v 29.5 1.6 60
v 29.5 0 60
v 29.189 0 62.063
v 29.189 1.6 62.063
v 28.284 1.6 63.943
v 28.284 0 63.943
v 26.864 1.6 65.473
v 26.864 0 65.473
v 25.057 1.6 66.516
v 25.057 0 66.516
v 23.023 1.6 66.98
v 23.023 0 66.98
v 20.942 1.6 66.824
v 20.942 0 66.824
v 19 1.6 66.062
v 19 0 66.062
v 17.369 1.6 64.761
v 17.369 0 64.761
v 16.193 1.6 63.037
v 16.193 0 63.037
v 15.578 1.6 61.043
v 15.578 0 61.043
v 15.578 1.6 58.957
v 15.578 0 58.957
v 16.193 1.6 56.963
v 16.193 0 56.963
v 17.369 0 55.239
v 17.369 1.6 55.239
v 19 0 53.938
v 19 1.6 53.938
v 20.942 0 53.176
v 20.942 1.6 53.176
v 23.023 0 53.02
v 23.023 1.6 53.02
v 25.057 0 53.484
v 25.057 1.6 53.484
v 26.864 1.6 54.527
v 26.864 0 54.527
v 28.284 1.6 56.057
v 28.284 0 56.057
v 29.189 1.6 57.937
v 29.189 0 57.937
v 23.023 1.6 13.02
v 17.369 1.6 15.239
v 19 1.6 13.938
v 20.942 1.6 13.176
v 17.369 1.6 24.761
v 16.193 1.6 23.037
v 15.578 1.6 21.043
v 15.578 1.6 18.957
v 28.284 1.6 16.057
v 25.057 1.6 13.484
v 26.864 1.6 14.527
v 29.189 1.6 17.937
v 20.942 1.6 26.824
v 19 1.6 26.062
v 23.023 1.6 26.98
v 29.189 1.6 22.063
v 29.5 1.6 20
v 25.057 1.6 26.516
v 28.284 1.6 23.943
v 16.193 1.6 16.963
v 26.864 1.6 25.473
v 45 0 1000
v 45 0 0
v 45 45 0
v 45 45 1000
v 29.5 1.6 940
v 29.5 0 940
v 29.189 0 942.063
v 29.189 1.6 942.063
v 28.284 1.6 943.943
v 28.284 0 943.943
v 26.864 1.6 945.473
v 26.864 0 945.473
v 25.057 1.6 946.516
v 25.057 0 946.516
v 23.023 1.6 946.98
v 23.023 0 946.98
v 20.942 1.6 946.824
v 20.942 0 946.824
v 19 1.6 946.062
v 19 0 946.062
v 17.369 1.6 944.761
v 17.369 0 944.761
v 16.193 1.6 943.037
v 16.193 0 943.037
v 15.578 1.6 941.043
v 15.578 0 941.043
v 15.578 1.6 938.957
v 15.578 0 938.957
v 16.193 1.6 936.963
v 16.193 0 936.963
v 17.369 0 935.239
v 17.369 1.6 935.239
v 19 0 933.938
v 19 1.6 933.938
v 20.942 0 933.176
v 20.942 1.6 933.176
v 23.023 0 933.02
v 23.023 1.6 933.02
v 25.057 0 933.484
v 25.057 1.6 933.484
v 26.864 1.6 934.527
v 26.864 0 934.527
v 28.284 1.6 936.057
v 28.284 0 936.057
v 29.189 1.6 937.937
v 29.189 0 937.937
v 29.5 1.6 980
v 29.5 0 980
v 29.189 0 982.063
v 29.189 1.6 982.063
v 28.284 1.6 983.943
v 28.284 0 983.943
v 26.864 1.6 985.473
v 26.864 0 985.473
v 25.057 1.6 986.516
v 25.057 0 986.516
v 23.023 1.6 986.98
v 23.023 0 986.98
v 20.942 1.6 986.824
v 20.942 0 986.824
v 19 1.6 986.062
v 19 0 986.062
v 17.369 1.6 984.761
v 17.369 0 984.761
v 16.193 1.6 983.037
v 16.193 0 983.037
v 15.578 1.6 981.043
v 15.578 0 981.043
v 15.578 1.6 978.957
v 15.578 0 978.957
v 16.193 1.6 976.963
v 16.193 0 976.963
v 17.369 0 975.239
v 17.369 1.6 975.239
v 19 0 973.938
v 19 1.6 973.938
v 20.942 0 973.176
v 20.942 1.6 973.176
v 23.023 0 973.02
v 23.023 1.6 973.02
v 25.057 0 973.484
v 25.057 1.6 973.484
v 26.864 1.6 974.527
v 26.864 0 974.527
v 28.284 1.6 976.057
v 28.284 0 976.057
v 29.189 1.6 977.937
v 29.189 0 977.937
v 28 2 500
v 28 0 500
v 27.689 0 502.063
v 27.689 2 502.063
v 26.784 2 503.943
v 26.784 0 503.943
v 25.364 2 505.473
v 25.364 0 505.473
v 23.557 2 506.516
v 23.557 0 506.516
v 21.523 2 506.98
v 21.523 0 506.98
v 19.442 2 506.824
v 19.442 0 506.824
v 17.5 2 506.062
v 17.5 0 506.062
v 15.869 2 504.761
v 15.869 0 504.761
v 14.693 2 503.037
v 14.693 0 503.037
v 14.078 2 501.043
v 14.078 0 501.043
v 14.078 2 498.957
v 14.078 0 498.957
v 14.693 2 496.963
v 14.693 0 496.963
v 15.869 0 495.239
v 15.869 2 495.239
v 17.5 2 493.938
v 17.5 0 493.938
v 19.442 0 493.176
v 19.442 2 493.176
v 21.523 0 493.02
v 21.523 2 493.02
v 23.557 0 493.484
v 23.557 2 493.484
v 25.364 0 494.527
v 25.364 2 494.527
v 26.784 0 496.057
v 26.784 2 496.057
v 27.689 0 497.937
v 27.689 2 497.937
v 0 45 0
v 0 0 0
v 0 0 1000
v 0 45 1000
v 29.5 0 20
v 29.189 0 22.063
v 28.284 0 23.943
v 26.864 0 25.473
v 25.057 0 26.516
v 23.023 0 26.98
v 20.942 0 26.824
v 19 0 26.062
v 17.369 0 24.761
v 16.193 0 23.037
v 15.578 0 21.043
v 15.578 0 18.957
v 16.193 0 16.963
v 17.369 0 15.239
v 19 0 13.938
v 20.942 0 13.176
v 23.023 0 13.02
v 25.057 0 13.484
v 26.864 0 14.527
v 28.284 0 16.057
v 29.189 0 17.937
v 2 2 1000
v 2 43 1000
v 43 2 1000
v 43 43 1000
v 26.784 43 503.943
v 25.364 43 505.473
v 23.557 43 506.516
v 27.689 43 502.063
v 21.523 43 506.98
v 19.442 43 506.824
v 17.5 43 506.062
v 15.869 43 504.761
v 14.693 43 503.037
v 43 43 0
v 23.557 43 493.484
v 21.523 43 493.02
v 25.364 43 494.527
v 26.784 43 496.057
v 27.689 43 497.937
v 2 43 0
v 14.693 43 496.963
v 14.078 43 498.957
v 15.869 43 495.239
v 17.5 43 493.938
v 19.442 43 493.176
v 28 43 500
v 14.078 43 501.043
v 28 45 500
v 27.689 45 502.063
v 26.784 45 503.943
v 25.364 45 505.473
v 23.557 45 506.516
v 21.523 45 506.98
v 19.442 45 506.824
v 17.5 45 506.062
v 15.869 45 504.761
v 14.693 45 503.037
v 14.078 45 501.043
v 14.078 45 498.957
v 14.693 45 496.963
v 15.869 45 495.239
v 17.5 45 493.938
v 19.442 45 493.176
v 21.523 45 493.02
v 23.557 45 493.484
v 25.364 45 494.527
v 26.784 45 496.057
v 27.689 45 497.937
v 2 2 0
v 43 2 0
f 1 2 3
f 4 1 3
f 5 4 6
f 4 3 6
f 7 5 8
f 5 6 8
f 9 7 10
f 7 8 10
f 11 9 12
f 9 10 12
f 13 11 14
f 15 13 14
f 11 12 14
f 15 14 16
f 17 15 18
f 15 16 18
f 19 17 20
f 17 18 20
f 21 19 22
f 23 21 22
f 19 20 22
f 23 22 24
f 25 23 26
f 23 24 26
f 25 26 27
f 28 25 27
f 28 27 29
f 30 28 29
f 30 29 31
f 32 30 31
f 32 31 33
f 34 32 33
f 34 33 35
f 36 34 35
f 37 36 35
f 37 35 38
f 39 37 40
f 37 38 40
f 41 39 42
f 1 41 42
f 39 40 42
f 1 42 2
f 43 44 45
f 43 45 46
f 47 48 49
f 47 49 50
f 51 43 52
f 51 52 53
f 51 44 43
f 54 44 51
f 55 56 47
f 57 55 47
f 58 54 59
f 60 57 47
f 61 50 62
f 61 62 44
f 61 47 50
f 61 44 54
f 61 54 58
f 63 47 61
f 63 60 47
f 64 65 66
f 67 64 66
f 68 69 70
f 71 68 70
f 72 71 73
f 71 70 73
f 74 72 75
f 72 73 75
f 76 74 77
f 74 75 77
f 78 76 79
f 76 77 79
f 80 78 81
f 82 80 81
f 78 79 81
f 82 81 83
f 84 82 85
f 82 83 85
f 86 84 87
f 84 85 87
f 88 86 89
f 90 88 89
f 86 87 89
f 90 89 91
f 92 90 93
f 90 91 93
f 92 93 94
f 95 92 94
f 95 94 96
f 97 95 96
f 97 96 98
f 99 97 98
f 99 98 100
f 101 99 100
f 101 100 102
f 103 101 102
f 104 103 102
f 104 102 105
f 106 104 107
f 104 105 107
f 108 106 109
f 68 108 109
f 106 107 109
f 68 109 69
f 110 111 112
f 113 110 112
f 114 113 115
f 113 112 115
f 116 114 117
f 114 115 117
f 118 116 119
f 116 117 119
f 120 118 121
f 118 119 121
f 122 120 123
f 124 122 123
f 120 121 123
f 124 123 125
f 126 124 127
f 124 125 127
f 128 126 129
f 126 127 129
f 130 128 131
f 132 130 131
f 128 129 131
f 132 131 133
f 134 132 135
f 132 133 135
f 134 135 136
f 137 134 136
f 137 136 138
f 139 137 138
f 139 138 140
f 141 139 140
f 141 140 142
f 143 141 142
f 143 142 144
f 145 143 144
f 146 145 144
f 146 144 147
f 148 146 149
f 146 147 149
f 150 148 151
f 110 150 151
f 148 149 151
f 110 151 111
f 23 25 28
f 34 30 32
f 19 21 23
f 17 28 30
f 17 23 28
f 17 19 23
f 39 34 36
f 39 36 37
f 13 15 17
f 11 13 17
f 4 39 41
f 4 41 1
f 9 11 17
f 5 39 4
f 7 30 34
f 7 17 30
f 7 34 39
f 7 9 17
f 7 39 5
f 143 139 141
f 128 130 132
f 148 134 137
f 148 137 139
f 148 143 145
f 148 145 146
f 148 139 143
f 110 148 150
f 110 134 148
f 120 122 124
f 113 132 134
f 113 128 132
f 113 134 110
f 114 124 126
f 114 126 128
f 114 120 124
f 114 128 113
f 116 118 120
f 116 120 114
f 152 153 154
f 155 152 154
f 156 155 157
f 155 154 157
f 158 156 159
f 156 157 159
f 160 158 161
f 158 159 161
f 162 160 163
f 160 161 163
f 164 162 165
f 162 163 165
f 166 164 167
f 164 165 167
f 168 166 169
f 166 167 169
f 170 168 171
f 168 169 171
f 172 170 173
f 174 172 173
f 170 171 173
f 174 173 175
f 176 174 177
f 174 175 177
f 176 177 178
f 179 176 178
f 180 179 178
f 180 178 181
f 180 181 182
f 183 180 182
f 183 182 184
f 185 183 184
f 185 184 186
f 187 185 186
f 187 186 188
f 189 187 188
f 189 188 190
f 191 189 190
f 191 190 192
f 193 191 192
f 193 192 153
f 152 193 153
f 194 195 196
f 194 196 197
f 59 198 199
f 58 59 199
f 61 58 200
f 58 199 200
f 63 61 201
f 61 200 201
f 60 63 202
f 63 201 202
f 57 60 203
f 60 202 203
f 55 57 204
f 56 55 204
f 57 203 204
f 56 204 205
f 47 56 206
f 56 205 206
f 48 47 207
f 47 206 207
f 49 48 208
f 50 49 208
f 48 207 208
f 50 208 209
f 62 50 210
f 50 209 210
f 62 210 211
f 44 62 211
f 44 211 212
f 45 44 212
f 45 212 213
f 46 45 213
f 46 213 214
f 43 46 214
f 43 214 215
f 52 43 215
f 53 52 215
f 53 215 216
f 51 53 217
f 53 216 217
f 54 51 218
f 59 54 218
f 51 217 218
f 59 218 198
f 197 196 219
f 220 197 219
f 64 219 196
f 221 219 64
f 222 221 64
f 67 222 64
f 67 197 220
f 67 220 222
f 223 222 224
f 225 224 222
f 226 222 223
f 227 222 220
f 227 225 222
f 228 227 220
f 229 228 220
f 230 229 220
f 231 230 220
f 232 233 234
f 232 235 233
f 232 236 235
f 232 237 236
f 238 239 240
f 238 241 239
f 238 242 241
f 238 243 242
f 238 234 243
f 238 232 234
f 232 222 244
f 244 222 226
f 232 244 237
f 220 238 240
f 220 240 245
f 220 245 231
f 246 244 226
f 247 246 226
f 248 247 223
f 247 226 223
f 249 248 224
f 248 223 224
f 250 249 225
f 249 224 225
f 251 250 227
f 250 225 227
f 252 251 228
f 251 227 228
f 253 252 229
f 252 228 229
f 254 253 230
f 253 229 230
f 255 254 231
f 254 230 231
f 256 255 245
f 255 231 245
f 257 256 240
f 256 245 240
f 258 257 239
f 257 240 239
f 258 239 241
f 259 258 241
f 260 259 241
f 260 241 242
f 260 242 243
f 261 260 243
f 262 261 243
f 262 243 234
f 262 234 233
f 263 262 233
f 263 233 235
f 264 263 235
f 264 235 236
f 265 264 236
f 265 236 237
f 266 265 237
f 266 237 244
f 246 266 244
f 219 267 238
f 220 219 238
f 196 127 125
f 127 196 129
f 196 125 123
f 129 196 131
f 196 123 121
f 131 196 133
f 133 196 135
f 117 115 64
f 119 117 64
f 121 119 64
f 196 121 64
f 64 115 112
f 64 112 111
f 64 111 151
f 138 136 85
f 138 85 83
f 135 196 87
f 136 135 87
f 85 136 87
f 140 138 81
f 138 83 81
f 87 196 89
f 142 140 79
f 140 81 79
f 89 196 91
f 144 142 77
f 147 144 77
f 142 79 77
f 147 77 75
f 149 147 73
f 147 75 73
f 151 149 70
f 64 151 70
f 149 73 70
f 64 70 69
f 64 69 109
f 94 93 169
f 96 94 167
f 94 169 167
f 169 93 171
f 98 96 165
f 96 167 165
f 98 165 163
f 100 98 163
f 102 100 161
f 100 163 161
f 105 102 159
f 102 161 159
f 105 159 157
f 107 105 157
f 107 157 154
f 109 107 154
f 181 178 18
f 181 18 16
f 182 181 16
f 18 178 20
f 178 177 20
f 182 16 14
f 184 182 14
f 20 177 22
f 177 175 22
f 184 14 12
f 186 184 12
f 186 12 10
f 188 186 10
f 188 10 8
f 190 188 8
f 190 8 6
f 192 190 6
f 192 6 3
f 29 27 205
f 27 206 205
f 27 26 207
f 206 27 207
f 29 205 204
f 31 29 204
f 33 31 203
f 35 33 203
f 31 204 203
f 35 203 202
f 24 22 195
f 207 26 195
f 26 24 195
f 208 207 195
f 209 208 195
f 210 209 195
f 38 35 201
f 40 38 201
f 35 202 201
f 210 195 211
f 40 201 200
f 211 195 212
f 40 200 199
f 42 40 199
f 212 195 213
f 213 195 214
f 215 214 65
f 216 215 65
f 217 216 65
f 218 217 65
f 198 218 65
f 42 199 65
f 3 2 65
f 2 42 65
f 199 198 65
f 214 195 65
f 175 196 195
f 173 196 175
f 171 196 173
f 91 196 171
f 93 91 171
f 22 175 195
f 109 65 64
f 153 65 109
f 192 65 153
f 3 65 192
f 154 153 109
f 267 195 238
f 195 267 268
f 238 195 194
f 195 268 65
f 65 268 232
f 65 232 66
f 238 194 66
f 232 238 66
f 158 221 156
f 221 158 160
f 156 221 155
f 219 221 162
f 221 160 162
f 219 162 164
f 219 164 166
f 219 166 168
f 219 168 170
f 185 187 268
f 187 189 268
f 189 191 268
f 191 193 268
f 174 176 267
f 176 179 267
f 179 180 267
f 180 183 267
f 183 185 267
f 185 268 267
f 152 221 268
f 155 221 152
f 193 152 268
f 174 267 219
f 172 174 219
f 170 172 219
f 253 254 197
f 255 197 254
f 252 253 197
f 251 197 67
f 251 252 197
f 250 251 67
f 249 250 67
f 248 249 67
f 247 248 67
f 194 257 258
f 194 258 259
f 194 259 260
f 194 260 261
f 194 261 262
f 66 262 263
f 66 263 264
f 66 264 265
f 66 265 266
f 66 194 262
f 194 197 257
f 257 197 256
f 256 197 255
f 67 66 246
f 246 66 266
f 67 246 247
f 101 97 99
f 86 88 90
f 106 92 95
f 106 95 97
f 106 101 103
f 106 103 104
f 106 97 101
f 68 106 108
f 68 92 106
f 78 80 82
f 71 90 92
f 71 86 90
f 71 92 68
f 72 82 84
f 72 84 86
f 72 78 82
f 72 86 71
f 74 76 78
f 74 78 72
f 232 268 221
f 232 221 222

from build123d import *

# Parameters (mm, degrees)
CROQUIS2_W              = 45
CROQUIS2_H              = 45
SALIENTE_EXTRUIR3_DEPTH = 1000
CROQUIS12_W             = 41
CROQUIS12_H             = 41
CORTAR_EXTRUIR8_DEPTH   = 1003.022953829
CROQUIS13_R             = 7
CORTAR_EXTRUIR9_DEPTH   = 1.6
CROQUIS15_R             = 7
CORTAR_EXTRUIR11_DEPTH  = 1003.022953829


with BuildPart() as part:
    # Croquis2 → Saliente-Extruir3 (new body)
    with BuildSketch(Plane.XY):
        with Locations((22.5, 22.5)):
            Rectangle(CROQUIS2_W, CROQUIS2_H)
    extrude(amount=SALIENTE_EXTRUIR3_DEPTH)

    # Croquis12 → Cortar-Extruir8 (cut, through all)
    with BuildSketch(Plane(origin=(0, 0, 0), x_dir=(-1, 0, 0), z_dir=(0, 0, -1))):
        with Locations((-22.5, 22.5)):
            Rectangle(CROQUIS12_W, CROQUIS12_H)
    extrude(amount=-CORTAR_EXTRUIR8_DEPTH, mode=Mode.SUBTRACT)

    # Croquis13 → Cortar-Extruir9 (cut)
    with BuildSketch(Plane.XZ):
        with Locations((22.5, 980)):
            Circle(CROQUIS13_R)
        with Locations((22.5, 940)):
            Circle(CROQUIS13_R)
        with Locations((22.5, 20)):
            Circle(CROQUIS13_R)
        with Locations((22.5, 60)):
            Circle(CROQUIS13_R)
    extrude(amount=-CORTAR_EXTRUIR9_DEPTH, mode=Mode.SUBTRACT)

    # Croquis15 → Cortar-Extruir11 (cut, through all)
    with BuildSketch(Plane.XZ):
        with Locations((21, 500)):
            Circle(CROQUIS15_R)
    extrude(amount=-CORTAR_EXTRUIR11_DEPTH, mode=Mode.SUBTRACT)


solid = part.part
